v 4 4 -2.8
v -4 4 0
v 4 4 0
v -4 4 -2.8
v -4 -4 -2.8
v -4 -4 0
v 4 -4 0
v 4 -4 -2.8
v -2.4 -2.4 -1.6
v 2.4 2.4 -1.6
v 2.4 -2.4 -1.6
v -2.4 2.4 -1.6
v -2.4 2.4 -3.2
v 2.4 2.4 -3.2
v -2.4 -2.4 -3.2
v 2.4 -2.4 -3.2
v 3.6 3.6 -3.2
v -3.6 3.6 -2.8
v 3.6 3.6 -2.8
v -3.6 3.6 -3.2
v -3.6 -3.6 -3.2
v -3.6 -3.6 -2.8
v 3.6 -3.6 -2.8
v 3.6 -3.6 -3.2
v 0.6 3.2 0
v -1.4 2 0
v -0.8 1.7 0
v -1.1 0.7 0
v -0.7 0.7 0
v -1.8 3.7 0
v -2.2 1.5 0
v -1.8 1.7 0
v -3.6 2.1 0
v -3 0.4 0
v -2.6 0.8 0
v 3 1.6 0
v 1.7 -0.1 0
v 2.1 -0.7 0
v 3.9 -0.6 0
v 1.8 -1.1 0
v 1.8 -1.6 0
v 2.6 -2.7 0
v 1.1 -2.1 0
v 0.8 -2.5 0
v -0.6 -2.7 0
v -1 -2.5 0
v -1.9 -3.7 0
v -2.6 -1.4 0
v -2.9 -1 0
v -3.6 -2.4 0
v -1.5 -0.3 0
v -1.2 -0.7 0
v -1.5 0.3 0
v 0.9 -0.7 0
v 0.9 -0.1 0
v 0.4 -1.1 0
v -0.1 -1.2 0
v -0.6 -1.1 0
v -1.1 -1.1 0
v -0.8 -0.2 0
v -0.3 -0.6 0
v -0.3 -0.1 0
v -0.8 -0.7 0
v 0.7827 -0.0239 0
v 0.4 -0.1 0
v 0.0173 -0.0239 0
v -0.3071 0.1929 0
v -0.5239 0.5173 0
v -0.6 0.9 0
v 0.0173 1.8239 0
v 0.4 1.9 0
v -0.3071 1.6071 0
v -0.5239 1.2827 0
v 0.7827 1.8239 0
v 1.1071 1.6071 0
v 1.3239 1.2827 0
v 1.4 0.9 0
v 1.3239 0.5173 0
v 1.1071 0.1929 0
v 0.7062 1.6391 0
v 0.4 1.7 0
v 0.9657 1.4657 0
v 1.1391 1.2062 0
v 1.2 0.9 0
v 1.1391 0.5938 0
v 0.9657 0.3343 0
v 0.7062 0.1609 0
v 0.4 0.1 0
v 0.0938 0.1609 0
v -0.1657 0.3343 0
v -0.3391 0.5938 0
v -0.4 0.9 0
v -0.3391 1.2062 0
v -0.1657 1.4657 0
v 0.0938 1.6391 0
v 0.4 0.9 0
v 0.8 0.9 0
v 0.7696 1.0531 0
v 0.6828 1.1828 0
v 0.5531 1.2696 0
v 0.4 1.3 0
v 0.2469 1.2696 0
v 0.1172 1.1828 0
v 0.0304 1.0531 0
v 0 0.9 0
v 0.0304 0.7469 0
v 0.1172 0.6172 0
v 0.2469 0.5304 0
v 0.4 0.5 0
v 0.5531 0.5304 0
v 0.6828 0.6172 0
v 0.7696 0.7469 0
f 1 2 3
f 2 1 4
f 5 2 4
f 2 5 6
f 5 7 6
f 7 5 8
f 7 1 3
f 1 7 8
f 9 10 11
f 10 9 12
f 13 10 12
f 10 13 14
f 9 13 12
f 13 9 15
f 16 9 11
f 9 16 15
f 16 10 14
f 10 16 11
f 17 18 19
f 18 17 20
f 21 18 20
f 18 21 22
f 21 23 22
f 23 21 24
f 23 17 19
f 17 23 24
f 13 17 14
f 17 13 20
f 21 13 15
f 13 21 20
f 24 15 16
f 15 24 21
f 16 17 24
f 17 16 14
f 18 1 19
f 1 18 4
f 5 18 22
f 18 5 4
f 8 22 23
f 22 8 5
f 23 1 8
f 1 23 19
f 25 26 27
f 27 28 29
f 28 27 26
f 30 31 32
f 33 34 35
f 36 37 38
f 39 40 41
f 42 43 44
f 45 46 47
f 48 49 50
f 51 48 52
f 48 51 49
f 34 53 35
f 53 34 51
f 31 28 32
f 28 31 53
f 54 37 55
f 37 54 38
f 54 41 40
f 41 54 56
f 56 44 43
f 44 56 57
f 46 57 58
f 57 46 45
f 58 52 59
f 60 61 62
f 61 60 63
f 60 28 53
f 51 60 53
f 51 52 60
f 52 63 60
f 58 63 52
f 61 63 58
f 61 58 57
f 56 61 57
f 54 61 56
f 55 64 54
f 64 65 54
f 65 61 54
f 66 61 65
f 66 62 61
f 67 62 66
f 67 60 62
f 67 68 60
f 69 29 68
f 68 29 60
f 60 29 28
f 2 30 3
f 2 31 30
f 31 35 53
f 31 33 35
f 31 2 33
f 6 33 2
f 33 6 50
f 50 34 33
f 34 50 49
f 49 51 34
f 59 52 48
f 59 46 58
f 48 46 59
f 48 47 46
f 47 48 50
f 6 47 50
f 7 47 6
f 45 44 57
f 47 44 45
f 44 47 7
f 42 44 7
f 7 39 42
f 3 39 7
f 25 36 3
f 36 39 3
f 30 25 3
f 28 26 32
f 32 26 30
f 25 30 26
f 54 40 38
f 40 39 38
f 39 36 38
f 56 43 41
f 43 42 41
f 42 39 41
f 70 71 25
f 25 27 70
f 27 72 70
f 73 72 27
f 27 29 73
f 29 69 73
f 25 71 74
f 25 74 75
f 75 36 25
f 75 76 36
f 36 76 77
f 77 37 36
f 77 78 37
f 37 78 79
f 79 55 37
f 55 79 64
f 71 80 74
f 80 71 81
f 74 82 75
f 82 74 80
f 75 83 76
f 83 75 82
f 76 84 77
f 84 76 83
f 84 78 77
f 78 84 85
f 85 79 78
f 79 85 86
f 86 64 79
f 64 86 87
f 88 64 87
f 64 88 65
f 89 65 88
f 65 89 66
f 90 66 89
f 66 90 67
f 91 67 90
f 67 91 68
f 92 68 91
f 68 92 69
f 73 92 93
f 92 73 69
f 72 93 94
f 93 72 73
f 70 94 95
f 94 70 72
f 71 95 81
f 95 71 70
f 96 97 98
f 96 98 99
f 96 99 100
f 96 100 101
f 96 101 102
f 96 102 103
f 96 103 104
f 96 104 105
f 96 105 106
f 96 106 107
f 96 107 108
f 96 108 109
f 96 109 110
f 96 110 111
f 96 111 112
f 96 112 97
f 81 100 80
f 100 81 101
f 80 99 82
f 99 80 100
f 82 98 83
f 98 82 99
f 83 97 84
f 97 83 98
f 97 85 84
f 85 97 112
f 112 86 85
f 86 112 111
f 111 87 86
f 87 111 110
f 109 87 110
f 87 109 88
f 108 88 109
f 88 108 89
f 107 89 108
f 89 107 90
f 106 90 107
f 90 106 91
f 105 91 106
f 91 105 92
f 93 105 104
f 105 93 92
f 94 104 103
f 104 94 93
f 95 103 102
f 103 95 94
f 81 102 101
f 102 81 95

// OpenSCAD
// file: ../p/4-4edge.scad
use <../lib.scad>
$fa=1; $fs=0.2;
function ldraw_lib__4_4edge(realsolid=false) = [
// 0 Circle 1.0
// 0 Name: 4-4edge.dat
// 0 Author: James Jessiman
// 0 !LDRAW_ORG Primitive UPDATE 2017-01
// 0 !LICENSE Licensed under CC BY 2.0 and CC BY 4.0 : see CAreadme.txt
// 
// 0 BFC CERTIFY CCW
  [0,"BFC","CERTIFY"],
  [0,"BFC","CCW"],
// 
// 0 !HISTORY 1998-12-15 [PTadmin] Official Update 1998-10
// 0 !HISTORY 2005-12-28 [PTadmin] Official Update 2005-01
// 0 !HISTORY 2007-06-24 [PTadmin] Header formatted for Contributor Agreement
// 0 !HISTORY 2008-07-01 [PTadmin] Official Update 2008-01
// 0 !HISTORY 2017-01-15 [Steffen] BFCed
// 0 !HISTORY 2017-12-30 [PTadmin] Official Update 2017-01
// 
// 
// 2 24 1 0 0 0.9239 0 0.3827
  [2,24,1,0,0,0.9239,0,0.3827],
// 2 24 0.9239 0 0.3827 0.7071 0 0.7071
  [2,24,0.9239,0,0.3827,0.7071,0,0.7071],
// 2 24 0.7071 0 0.7071 0.3827 0 0.9239
  [2,24,0.7071,0,0.7071,0.3827,0,0.9239],
// 2 24 0.3827 0 0.9239 0 0 1
  [2,24,0.3827,0,0.9239,0,0,1],
// 2 24 0 0 1 -0.3827 0 0.9239
  [2,24,0,0,1,-0.3827,0,0.9239],
// 2 24 -0.3827 0 0.9239 -0.7071 0 0.7071
  [2,24,-0.3827,0,0.9239,-0.7071,0,0.7071],
// 2 24 -0.7071 0 0.7071 -0.9239 0 0.3827
  [2,24,-0.7071,0,0.7071,-0.9239,0,0.3827],
// 2 24 -0.9239 0 0.3827 -1 0 -0
  [2,24,-0.9239,0,0.3827,-1,0,-0],
// 2 24 -1 0 -0 -0.9239 0 -0.3827
  [2,24,-1,0,-0,-0.9239,0,-0.3827],
// 2 24 -0.9239 0 -0.3827 -0.7071 0 -0.7071
  [2,24,-0.9239,0,-0.3827,-0.7071,0,-0.7071],
// 2 24 -0.7071 0 -0.7071 -0.3827 0 -0.9239
  [2,24,-0.7071,0,-0.7071,-0.3827,0,-0.9239],
// 2 24 -0.3827 0 -0.9239 0 0 -1
  [2,24,-0.3827,0,-0.9239,0,0,-1],
// 2 24 0 0 -1 0.3827 0 -0.9239
  [2,24,0,0,-1,0.3827,0,-0.9239],
// 2 24 0.3827 0 -0.9239 0.7071 0 -0.7071
  [2,24,0.3827,0,-0.9239,0.7071,0,-0.7071],
// 2 24 0.7071 0 -0.7071 0.9239 0 -0.3827
  [2,24,0.7071,0,-0.7071,0.9239,0,-0.3827],
// 2 24 0.9239 0 -0.3827 1 0 0
  [2,24,0.9239,0,-0.3827,1,0,0],
];
module ldraw_lib__4_4edge(step=0, col=false, unit=2/5, alt=false, line=0.2, solid=!$preview)
    makepoly(ldraw_lib__4_4edge(solid), step=step, col=col, unit=unit, alt=alt, line=line, solid=solid);
ldraw_lib__4_4edge(line=0.2);
// file: ../p/4-4cyli.scad
use <../lib.scad>
$fa=1; $fs=0.2;
function ldraw_lib__4_4cyli(realsolid=false) = [
// 0 Cylinder 1.0
// 0 Name: 4-4cyli.dat
// 0 Author: James Jessiman
// 0 !LDRAW_ORG Primitive UPDATE 2005-01
// 0 !LICENSE Licensed under CC BY 2.0 and CC BY 4.0 : see CAreadme.txt
// 
// 0 BFC CERTIFY CCW
  [0,"BFC","CERTIFY"],
  [0,"BFC","CCW"],
// 
// 0 !HISTORY 1998-12-15 [PTadmin] Official Update 1998-10
// 0 !HISTORY 2002-03-23 [sbliss] Added BFC statement; merged headers from files in distributions LDraw 0.27 and Complete.
// 0 !HISTORY 2002-04-25 [PTadmin] Official Update 2002-02
// 0 !HISTORY 2004-12-14 [guyvivan] BFC CCW
// 0 !HISTORY 2005-12-28 [PTadmin] Official Update 2005-01
// 0 !HISTORY 2007-06-24 [PTadmin] Header formatted for Contributor Agreement
// 0 !HISTORY 2008-07-01 [PTadmin] Official Update 2008-01
// 
// 
// 4 16 1 1 0 0.9239 1 0.3827 0.9239 0 0.3827 1 0 0
  [4,16,1,1,0,0.9239,1,0.3827,0.9239,0,0.3827,1,0,0],
// 5 24 1 0 0 1 1 0 0.9239 0 0.3827 0.9239 0 -0.3827
  [5,24,1,0,0,1,1,0,0.9239,0,0.3827,0.9239,0,-0.3827],
// 4 16 0.9239 1 0.3827 0.7071 1 0.7071 0.7071 0 0.7071 0.9239 0 0.3827
  [4,16,0.9239,1,0.3827,0.7071,1,0.7071,0.7071,0,0.7071,0.9239,0,0.3827],
// 5 24 0.9239 0 0.3827 0.9239 1 0.3827 0.7071 0 0.7071 1 0 0
  [5,24,0.9239,0,0.3827,0.9239,1,0.3827,0.7071,0,0.7071,1,0,0],
// 4 16 0.7071 1 0.7071 0.3827 1 0.9239 0.3827 0 0.9239 0.7071 0 0.7071
  [4,16,0.7071,1,0.7071,0.3827,1,0.9239,0.3827,0,0.9239,0.7071,0,0.7071],
// 5 24 0.7071 0 0.7071 0.7071 1 0.7071 0.3827 0 0.9239 0.9239 0 0.3827
  [5,24,0.7071,0,0.7071,0.7071,1,0.7071,0.3827,0,0.9239,0.9239,0,0.3827],
// 4 16 0.3827 1 0.9239 0 1 1 0 0 1 0.3827 0 0.9239
  [4,16,0.3827,1,0.9239,0,1,1,0,0,1,0.3827,0,0.9239],
// 5 24 0.3827 0 0.9239 0.3827 1 0.9239 0 0 1 0.7071 0 0.7071
  [5,24,0.3827,0,0.9239,0.3827,1,0.9239,0,0,1,0.7071,0,0.7071],
// 4 16 0 1 1 -0.3827 1 0.9239 -0.3827 0 0.9239 0 0 1
  [4,16,0,1,1,-0.3827,1,0.9239,-0.3827,0,0.9239,0,0,1],
// 5 24 0 0 1 0 1 1 -0.3827 0 0.9239 0.3827 0 0.9239
  [5,24,0,0,1,0,1,1,-0.3827,0,0.9239,0.3827,0,0.9239],
// 4 16 -0.3827 1 0.9239 -0.7071 1 0.7071 -0.7071 0 0.7071 -0.3827 0 0.9239
  [4,16,-0.3827,1,0.9239,-0.7071,1,0.7071,-0.7071,0,0.7071,-0.3827,0,0.9239],
// 5 24 -0.3827 0 0.9239 -0.3827 1 0.9239 -0.7071 0 0.7071 0 0 1
  [5,24,-0.3827,0,0.9239,-0.3827,1,0.9239,-0.7071,0,0.7071,0,0,1],
// 4 16 -0.7071 1 0.7071 -0.9239 1 0.3827 -0.9239 0 0.3827 -0.7071 0 0.7071
  [4,16,-0.7071,1,0.7071,-0.9239,1,0.3827,-0.9239,0,0.3827,-0.7071,0,0.7071],
// 5 24 -0.7071 0 0.7071 -0.7071 1 0.7071 -0.9239 0 0.3827 -0.3827 0 0.9239
  [5,24,-0.7071,0,0.7071,-0.7071,1,0.7071,-0.9239,0,0.3827,-0.3827,0,0.9239],
// 4 16 -0.9239 1 0.3827 -1 1 0 -1 0 0 -0.9239 0 0.3827
  [4,16,-0.9239,1,0.3827,-1,1,0,-1,0,0,-0.9239,0,0.3827],
// 5 24 -0.9239 0 0.3827 -0.9239 1 0.3827 -1 0 0 -0.7071 0 0.7071
  [5,24,-0.9239,0,0.3827,-0.9239,1,0.3827,-1,0,0,-0.7071,0,0.7071],
// 4 16 -1 1 0 -0.9239 1 -0.3827 -0.9239 0 -0.3827 -1 0 0
  [4,16,-1,1,0,-0.9239,1,-0.3827,-0.9239,0,-0.3827,-1,0,0],
// 5 24 -1 0 0 -1 1 0 -0.9239 0 -0.3827 -0.9239 0 0.3827
  [5,24,-1,0,0,-1,1,0,-0.9239,0,-0.3827,-0.9239,0,0.3827],
// 4 16 -0.9239 1 -0.3827 -0.7071 1 -0.7071 -0.7071 0 -0.7071 -0.9239 0 -0.3827
  [4,16,-0.9239,1,-0.3827,-0.7071,1,-0.7071,-0.7071,0,-0.7071,-0.9239,0,-0.3827],
// 5 24 -0.9239 0 -0.3827 -0.9239 1 -0.3827 -0.7071 0 -0.7071 -1 0 0
  [5,24,-0.9239,0,-0.3827,-0.9239,1,-0.3827,-0.7071,0,-0.7071,-1,0,0],
// 4 16 -0.7071 1 -0.7071 -0.3827 1 -0.9239 -0.3827 0 -0.9239 -0.7071 0 -0.7071
  [4,16,-0.7071,1,-0.7071,-0.3827,1,-0.9239,-0.3827,0,-0.9239,-0.7071,0,-0.7071],
// 5 24 -0.7071 0 -0.7071 -0.7071 1 -0.7071 -0.3827 0 -0.9239 -0.9239 0 -0.3827
  [5,24,-0.7071,0,-0.7071,-0.7071,1,-0.7071,-0.3827,0,-0.9239,-0.9239,0,-0.3827],
// 4 16 -0.3827 1 -0.9239 0 1 -1 0 0 -1 -0.3827 0 -0.9239
  [4,16,-0.3827,1,-0.9239,0,1,-1,0,0,-1,-0.3827,0,-0.9239],
// 5 24 -0.3827 0 -0.9239 -0.3827 1 -0.9239 0 0 -1 -0.7071 0 -0.7071
  [5,24,-0.3827,0,-0.9239,-0.3827,1,-0.9239,0,0,-1,-0.7071,0,-0.7071],
// 4 16 0 1 -1 0.3827 1 -0.9239 0.3827 0 -0.9239 0 0 -1
  [4,16,0,1,-1,0.3827,1,-0.9239,0.3827,0,-0.9239,0,0,-1],
// 5 24 0 0 -1 0 1 -1 0.3827 0 -0.9239 -0.3827 0 -0.9239
  [5,24,0,0,-1,0,1,-1,0.3827,0,-0.9239,-0.3827,0,-0.9239],
// 4 16 0.3827 1 -0.9239 0.7071 1 -0.7071 0.7071 0 -0.7071 0.3827 0 -0.9239
  [4,16,0.3827,1,-0.9239,0.7071,1,-0.7071,0.7071,0,-0.7071,0.3827,0,-0.9239],
// 5 24 0.3827 0 -0.9239 0.3827 1 -0.9239 0.7071 0 -0.7071 0 0 -1
  [5,24,0.3827,0,-0.9239,0.3827,1,-0.9239,0.7071,0,-0.7071,0,0,-1],
// 4 16 0.7071 1 -0.7071 0.9239 1 -0.3827 0.9239 0 -0.3827 0.7071 0 -0.7071
  [4,16,0.7071,1,-0.7071,0.9239,1,-0.3827,0.9239,0,-0.3827,0.7071,0,-0.7071],
// 5 24 0.7071 0 -0.7071 0.7071 1 -0.7071 0.9239 0 -0.3827 0.3827 0 -0.9239
  [5,24,0.7071,0,-0.7071,0.7071,1,-0.7071,0.9239,0,-0.3827,0.3827,0,-0.9239],
// 4 16 0.9239 1 -0.3827 1 1 0 1 0 0 0.9239 0 -0.3827
  [4,16,0.9239,1,-0.3827,1,1,0,1,0,0,0.9239,0,-0.3827],
// 5 24 0.9239 0 -0.3827 0.9239 1 -0.3827 1 0 0 0.7071 0 -0.7071
  [5,24,0.9239,0,-0.3827,0.9239,1,-0.3827,1,0,0,0.7071,0,-0.7071],
// 0
];
module ldraw_lib__4_4cyli(step=0, col=false, unit=2/5, alt=false, line=0.2, solid=!$preview)
    makepoly(ldraw_lib__4_4cyli(solid), step=step, col=col, unit=unit, alt=alt, line=line, solid=solid);
ldraw_lib__4_4cyli(line=0.2);
// file: ../p/stud3.scad
use <../lib.scad>
use <4-4cyli.scad>
use <4-4disc.scad>
use <4-4edge.scad>
$fa=1; $fs=0.2;
function ldraw_lib__stud3(realsolid=false) = realsolid ? 
    [openscad(translate([0,0,-eps()], o=cylinder(4+eps(), r=4)),2)] : [
// 0 Stud Tube Solid
// 0 Name: stud3.dat
// 0 Author: James Jessiman
// 0 !LDRAW_ORG Primitive UPDATE 2012-01
// 0 !LICENSE Licensed under CC BY 2.0 and CC BY 4.0 : see CAreadme.txt
// 
// 0 BFC CERTIFY CCW
  [0,"BFC","CERTIFY"],
  [0,"BFC","CCW"],
// 
// 0 !HISTORY 2002-04-04 [sbliss] Modified for BFC compliance
// 0 !HISTORY 2002-04-25 [PTadmin] Official Update 2002-02
// 0 !HISTORY 2007-06-24 [PTadmin] Header formatted for Contributor Agreement
// 0 !HISTORY 2008-07-01 [PTadmin] Official Update 2008-01
// 0 !HISTORY 2012-02-16 [Philo] Changed to CCW
// 0 !HISTORY 2012-03-30 [PTadmin] Official Update 2012-01
// 
// 
// 1 16 0 -4 0 4 0 0 0 1 0 0 0 4 4-4edge.dat
  [1,16,0,-4,0,4,0,0,0,1,0,0,0,4, ldraw_lib__4_4edge(realsolid)],
// 1 16 0 0 0 4 0 0 0 1 0 0 0 4 4-4edge.dat
  [1,16,0,0,0,4,0,0,0,1,0,0,0,4, ldraw_lib__4_4edge(realsolid)],
// 1 16 0 -4 0 4 0 0 0 1 0 0 0 4 4-4disc.dat
  [1,16,0,-4,0,4,0,0,0,1,0,0,0,4, ldraw_lib__4_4disc(realsolid)],
// 1 16 0 -4 0 4 0 0 0 4 0 0 0 4 4-4cyli.dat
  [1,16,0,-4,0,4,0,0,0,4,0,0,0,4, ldraw_lib__4_4cyli(realsolid)],
];
module ldraw_lib__stud3(step=0, col=false, unit=2/5, alt=false, line=0.2, solid=!$preview)
    makepoly(ldraw_lib__stud3(solid), step=step, col=col, unit=unit, alt=alt, line=line, solid=solid);
ldraw_lib__stud3(line=0.2);
// file: ../p/stud.scad
use <../lib.scad>
use <4-4cyli.scad>
use <4-4disc.scad>
use <4-4edge.scad>
$fa=1; $fs=0.2;
function ldraw_lib__stud(realsolid=false) = realsolid ? 
    [openscad(translate([0,0,-eps()], o=cylinder(4+eps(), r=6)),2)] : [
// 0 Stud
// 0 Name: stud.dat
// 0 Author: James Jessiman
// 0 !LDRAW_ORG Primitive UPDATE 2012-01
// 0 !LICENSE Licensed under CC BY 2.0 and CC BY 4.0 : see CAreadme.txt
// 
// 0 BFC CERTIFY CCW
  [0,"BFC","CERTIFY"],
  [0,"BFC","CCW"],
// 
// 0 !HISTORY 2002-04-04 [sbliss] Modified for BFC compliance
// 0 !HISTORY 2002-04-25 [PTadmin] Official Update 2002-02
// 0 !HISTORY 2007-06-24 [PTadmin] Header formatted for Contributor Agreement
// 0 !HISTORY 2008-07-01 [PTadmin] Official Update 2008-01
// 0 !HISTORY 2012-02-16 [Philo] Changed to CCW
// 0 !HISTORY 2012-03-30 [PTadmin] Official Update 2012-01
// 
// 
// 1 16 0 0 0 6 0 0 0 1 0 0 0 6 4-4edge.dat
  [1,16,0,0,0,6,0,0,0,1,0,0,0,6, ldraw_lib__4_4edge(realsolid)],
// 1 16 0 -4 0 6 0 0 0 1 0 0 0 6 4-4edge.dat
  [1,16,0,-4,0,6,0,0,0,1,0,0,0,6, ldraw_lib__4_4edge(realsolid)],
// 1 16 0 0 0 6 0 0 0 -4 0 0 0 6 4-4cyli.dat
  [1,16,0,0,0,6,0,0,0,-4,0,0,0,6, ldraw_lib__4_4cyli(realsolid)],
// 1 16 0 -4 0 6 0 0 0 1 0 0 0 6 4-4disc.dat
  [1,16,0,-4,0,6,0,0,0,1,0,0,0,6, ldraw_lib__4_4disc(realsolid)],
];
module ldraw_lib__stud(step=0, col=false, unit=2/5, alt=false, line=0.2, solid=!$preview)
    makepoly(ldraw_lib__stud(solid), step=step, col=col, unit=unit, alt=alt, line=line, solid=solid);
ldraw_lib__stud(line=0.2);
// file: ../p/box4t.scad
use <../lib.scad>
$fa=1; $fs=0.2;
function ldraw_lib__box4t(realsolid=false) = [
// 0 Box with 4 Adjacent Faces and All Edges
// 0 Name: box4t.dat
// 0 Author: Tore Eriksson [Tore_Eriksson]
// 0 !LDRAW_ORG Primitive UPDATE 2003-02
// 0 !LICENSE Licensed under CC BY 2.0 and CC BY 4.0 : see CAreadme.txt
// 
// 0 BFC CERTIFY CCW
  [0,"BFC","CERTIFY"],
  [0,"BFC","CCW"],
// 
// 0 !HISTORY 1997-09-29 [PTadmin] Official Update 1997-15
// 0 !HISTORY 2002-08-31 [izanette] Modified with WINDZ for BFC compliance
// 0 !HISTORY 2003-08-01 [PTadmin] Official Update 2003-02
// 0 !HISTORY 2007-06-24 [PTadmin] Header formatted for Contributor Agreement
// 0 !HISTORY 2008-07-01 [PTadmin] Official Update 2008-01
// 
// 
// 2 24 1 1 1 -1 1 1
  [2,24,1,1,1,-1,1,1],
// 2 24 -1 1 1 -1 1 -1
  [2,24,-1,1,1,-1,1,-1],
// 2 24 -1 1 -1 1 1 -1
  [2,24,-1,1,-1,1,1,-1],
// 2 24 1 1 -1 1 1 1
  [2,24,1,1,-1,1,1,1],
// 2 24 1 0 1 -1 0 1
  [2,24,1,0,1,-1,0,1],
// 2 24 -1 0 1 -1 0 -1
  [2,24,-1,0,1,-1,0,-1],
// 2 24 -1 0 -1 1 0 -1
  [2,24,-1,0,-1,1,0,-1],
// 2 24 1 0 -1 1 0 1
  [2,24,1,0,-1,1,0,1],
// 2 24 1 0 1 1 1 1
  [2,24,1,0,1,1,1,1],
// 2 24 -1 0 1 -1 1 1
  [2,24,-1,0,1,-1,1,1],
// 2 24 1 0 -1 1 1 -1
  [2,24,1,0,-1,1,1,-1],
// 2 24 -1 0 -1 -1 1 -1
  [2,24,-1,0,-1,-1,1,-1],
// 4 16 1 1 1 1 1 -1 -1 1 -1 -1 1 1
  [4,16,1,1,1,1,1,-1,-1,1,-1,-1,1,1],
// 4 16 1 1 1 -1 1 1 -1 0 1 1 0 1
  [4,16,1,1,1,-1,1,1,-1,0,1,1,0,1],
// 4 16 -1 1 1 -1 1 -1 -1 0 -1 -1 0 1
  [4,16,-1,1,1,-1,1,-1,-1,0,-1,-1,0,1],
// 0 4 16 -1 1 -1 -1 0 -1 1 0 -1 1 1 -1
// 4 16 1 1 -1 1 1 1 1 0 1 1 0 -1
  [4,16,1,1,-1,1,1,1,1,0,1,1,0,-1],
// 0
];
module ldraw_lib__box4t(step=0, col=false, unit=2/5, alt=false, line=0.2, solid=!$preview)
    makepoly(ldraw_lib__box4t(solid), step=step, col=col, unit=unit, alt=alt, line=line, solid=solid);
ldraw_lib__box4t(line=0.2);
// file: ../p/box5.scad
use <../lib.scad>
$fa=1; $fs=0.2;
function ldraw_lib__box5(realsolid=false) = [
// 0 Box with 5 Faces and All Edges
// 0 Name: box5.dat
// 0 Author: James Jessiman
// 0 !LDRAW_ORG Primitive UPDATE 2012-01
// 0 !LICENSE Licensed under CC BY 2.0 and CC BY 4.0 : see CAreadme.txt
// 
// 0 BFC CERTIFY CCW
  [0,"BFC","CERTIFY"],
  [0,"BFC","CCW"],
// 
// 0 !HISTORY 2002-04-03 [sbliss] Modified for BFC compliance
// 0 !HISTORY 2002-04-25 [PTadmin] Official Update 2002-02
// 0 !HISTORY 2007-06-24 [PTadmin] Header formatted for Contributor Agreement
// 0 !HISTORY 2008-07-01 [PTadmin] Official Update 2008-01
// 0 !HISTORY 2012-02-16 [Philo] Changed to CCW
// 0 !HISTORY 2012-03-30 [PTadmin] Official Update 2012-01
// 
// 
// 2 24 1 1 1 -1 1 1
  [2,24,1,1,1,-1,1,1],
// 2 24 -1 1 1 -1 1 -1
  [2,24,-1,1,1,-1,1,-1],
// 2 24 -1 1 -1 1 1 -1
  [2,24,-1,1,-1,1,1,-1],
// 2 24 1 1 -1 1 1 1
  [2,24,1,1,-1,1,1,1],
// 2 24 1 0 1 -1 0 1
  [2,24,1,0,1,-1,0,1],
// 2 24 -1 0 1 -1 0 -1
  [2,24,-1,0,1,-1,0,-1],
// 2 24 -1 0 -1 1 0 -1
  [2,24,-1,0,-1,1,0,-1],
// 2 24 1 0 -1 1 0 1
  [2,24,1,0,-1,1,0,1],
// 2 24 1 0 1 1 1 1
  [2,24,1,0,1,1,1,1],
// 2 24 -1 0 1 -1 1 1
  [2,24,-1,0,1,-1,1,1],
// 2 24 1 0 -1 1 1 -1
  [2,24,1,0,-1,1,1,-1],
// 2 24 -1 0 -1 -1 1 -1
  [2,24,-1,0,-1,-1,1,-1],
// 4 16 -1 1 1 1 1 1 1 1 -1 -1 1 -1
  [4,16,-1,1,1,1,1,1,1,1,-1,-1,1,-1],
// 4 16 -1 1 1 -1 0 1 1 0 1 1 1 1
  [4,16,-1,1,1,-1,0,1,1,0,1,1,1,1],
// 4 16 -1 1 -1 -1 0 -1 -1 0 1 -1 1 1
  [4,16,-1,1,-1,-1,0,-1,-1,0,1,-1,1,1],
// 4 16 1 1 -1 1 0 -1 -1 0 -1 -1 1 -1
  [4,16,1,1,-1,1,0,-1,-1,0,-1,-1,1,-1],
// 4 16 1 1 1 1 0 1 1 0 -1 1 1 -1
  [4,16,1,1,1,1,0,1,1,0,-1,1,1,-1],
];
module ldraw_lib__box5(step=0, col=false, unit=2/5, alt=false, line=0.2, solid=!$preview)
    makepoly(ldraw_lib__box5(solid), step=step, col=col, unit=unit, alt=alt, line=line, solid=solid);
ldraw_lib__box5(line=0.2);
// file: ../p/box4.scad
use <../lib.scad>
$fa=1; $fs=0.2;
function ldraw_lib__box4(realsolid=false) = [
// 0 Box with 4 Faces (2 Parallel Pairs) and All Edges
// 0 Name: box4.dat
// 0 Author: James Jessiman
// 0 !LDRAW_ORG Primitive UPDATE 2012-01
// 0 !LICENSE Licensed under CC BY 2.0 and CC BY 4.0 : see CAreadme.txt
// 
// 0 BFC CERTIFY CCW
  [0,"BFC","CERTIFY"],
  [0,"BFC","CCW"],
// 
// 0 !HISTORY 2002-04-03 [sbliss] Modified for BFC compliance
// 0 !HISTORY 2002-04-25 [PTadmin] Official Update 2002-02
// 0 !HISTORY 2007-06-24 [PTadmin] Header formatted for Contributor Agreement
// 0 !HISTORY 2008-07-01 [PTadmin] Official Update 2008-01
// 0 !HISTORY 2012-02-16 [Philo] Changed to CCW
// 0 !HISTORY 2012-03-30 [PTadmin] Official Update 2012-01
// 
// 
// 2 24 1 1 1 -1 1 1
  [2,24,1,1,1,-1,1,1],
// 2 24 -1 1 1 -1 1 -1
  [2,24,-1,1,1,-1,1,-1],
// 2 24 -1 1 -1 1 1 -1
  [2,24,-1,1,-1,1,1,-1],
// 2 24 1 1 -1 1 1 1
  [2,24,1,1,-1,1,1,1],
// 2 24 1 0 1 -1 0 1
  [2,24,1,0,1,-1,0,1],
// 2 24 -1 0 1 -1 0 -1
  [2,24,-1,0,1,-1,0,-1],
// 2 24 -1 0 -1 1 0 -1
  [2,24,-1,0,-1,1,0,-1],
// 2 24 1 0 -1 1 0 1
  [2,24,1,0,-1,1,0,1],
// 2 24 1 0 1 1 1 1
  [2,24,1,0,1,1,1,1],
// 2 24 -1 0 1 -1 1 1
  [2,24,-1,0,1,-1,1,1],
// 2 24 1 0 -1 1 1 -1
  [2,24,1,0,-1,1,1,-1],
// 2 24 -1 0 -1 -1 1 -1
  [2,24,-1,0,-1,-1,1,-1],
// 4 16 -1 1 1 -1 0 1 1 0 1 1 1 1
  [4,16,-1,1,1,-1,0,1,1,0,1,1,1,1],
// 4 16 -1 1 -1 -1 0 -1 -1 0 1 -1 1 1
  [4,16,-1,1,-1,-1,0,-1,-1,0,1,-1,1,1],
// 4 16 1 1 -1 1 0 -1 -1 0 -1 -1 1 -1
  [4,16,1,1,-1,1,0,-1,-1,0,-1,-1,1,-1],
// 4 16 1 1 1 1 0 1 1 0 -1 1 1 -1
  [4,16,1,1,1,1,0,1,1,0,-1,1,1,-1],
];
module ldraw_lib__box4(step=0, col=false, unit=2/5, alt=false, line=0.2, solid=!$preview)
    makepoly(ldraw_lib__box4(solid), step=step, col=col, unit=unit, alt=alt, line=line, solid=solid);
ldraw_lib__box4(line=0.2);
// file: s/3004s01.scad
use <../../lib.scad>
use <../../p/box4t.scad>
use <../../p/box5.scad>
use <../../p/stud.scad>
use <../../p/stud3.scad>
$fa=1; $fs=0.2;
function ldraw_lib__s__3004s01(realsolid=false) = [
// 0 ~Brick  1 x  2 without Front Face
// 0 Name: s\3004s01.dat
// 0 Author: James Jessiman
// 0 !LDRAW_ORG Subpart UPDATE 2003-03
// 0 !LICENSE Licensed under CC BY 2.0 and CC BY 4.0 : see CAreadme.txt
// 
// 0 BFC CERTIFY CCW
  [0,"BFC","CERTIFY"],
  [0,"BFC","CCW"],
// 
// 0 !HISTORY 2003-09-07 [jriley] Subfiling, BFC
// 0 !HISTORY 2003-12-19 [PTadmin] Official Update 2003-03
// 0 !HISTORY 2007-08-29 [PTadmin] Header formatted for Contributor Agreement
// 0 !HISTORY 2008-07-01 [PTadmin] Official Update 2008-01
// 
// 
// 1 16 0 4 0 1 0 0 0 -5 0 0 0 1 stud3.dat
  [1,16,0,4,0,1,0,0,0,-5,0,0,0,1, ldraw_lib__stud3(realsolid)],
// 0 BFC INVERTNEXT
  [0,"BFC","INVERTNEXT"],
// 1 16 0 24 0 16 0 0 0 -20 0 0 0 6 box5.dat
  [1,16,0,24,0,16,0,0,0,-20,0,0,0,6, ldraw_lib__box5(realsolid)],
// 4 16 20 24 10 16 24 6 -16 24 6 -20 24 10
  [4,16,20,24,10,16,24,6,-16,24,6,-20,24,10],
// 4 16 -20 24 10 -16 24 6 -16 24 -6 -20 24 -10
  [4,16,-20,24,10,-16,24,6,-16,24,-6,-20,24,-10],
// 4 16 -20 24 -10 -16 24 -6 16 24 -6 20 24 -10
  [4,16,-20,24,-10,-16,24,-6,16,24,-6,20,24,-10],
// 4 16 20 24 -10 16 24 -6 16 24 6 20 24 10
  [4,16,20,24,-10,16,24,-6,16,24,6,20,24,10],
// 1 16 0 24 0 20 0 0 0 -24 0 0 0 10 box4t.dat
  [1,16,0,24,0,20,0,0,0,-24,0,0,0,10, ldraw_lib__box4t(realsolid)],
// 1 16 10 0 0 1 0 0 0 1 0 0 0 1 stud.dat
  [1,16,10,0,0,1,0,0,0,1,0,0,0,1, ldraw_lib__stud(realsolid)],
// 1 16 -10 0 0 1 0 0 0 1 0 0 0 1 stud.dat
  [1,16,-10,0,0,1,0,0,0,1,0,0,0,1, ldraw_lib__stud(realsolid)],
// 0
];
module ldraw_lib__s__3004s01(step=0, col=false, unit=2/5, alt=false, line=0.2, solid=!$preview)
    makepoly(ldraw_lib__s__3004s01(solid), step=step, col=col, unit=unit, alt=alt, line=line, solid=solid);
ldraw_lib__s__3004s01(line=0.2);
// file: s/3070bs01.scad
use <../../lib.scad>
use <../../p/box4.scad>
use <../../p/box5.scad>
$fa=1; $fs=0.2;
function ldraw_lib__s__3070bs01(realsolid=false) = [
// 0 ~Tile  1 x  1 with Groove without Top Face
// 0 Name: s\3070bs01.dat
// 0 Author: Chris Dee [cwdee]
// 0 !LDRAW_ORG Subpart UPDATE 2009-02
// 0 !LICENSE Licensed under CC BY 2.0 and CC BY 4.0 : see CAreadme.txt
// 
// 0 BFC CERTIFY CCW
  [0,"BFC","CERTIFY"],
  [0,"BFC","CCW"],
// 
// 0 !HISTORY 2009-09-03 [PTadmin] Official Update 2009-02
// 
// 
// 1 16 0 0 0 10 0 0 0 7 0 0 0 10 box4.dat
  [1,16,0,0,0,10,0,0,0,7,0,0,0,10, ldraw_lib__box4(realsolid)],
// 0 BFC INVERTNEXT
  [0,"BFC","INVERTNEXT"],
// 1 16 0 8 0 6 0 0 0 -4 0 0 0 6 box5.dat
  [1,16,0,8,0,6,0,0,0,-4,0,0,0,6, ldraw_lib__box5(realsolid)],
// 1 16 0 7 0 9 0 0 0 1 0 0 0 9 box4.dat
  [1,16,0,7,0,9,0,0,0,1,0,0,0,9, ldraw_lib__box4(realsolid)],
// 
// 4 16 9 8 9 6 8 6 -6 8 6 -9 8 9
  [4,16,9,8,9,6,8,6,-6,8,6,-9,8,9],
// 4 16 -9 8 9 -6 8 6 -6 8 -6 -9 8 -9
  [4,16,-9,8,9,-6,8,6,-6,8,-6,-9,8,-9],
// 4 16 -9 8 -9 -6 8 -6 6 8 -6 9 8 -9
  [4,16,-9,8,-9,-6,8,-6,6,8,-6,9,8,-9],
// 4 16 9 8 -9 6 8 -6 6 8 6 9 8 9
  [4,16,9,8,-9,6,8,-6,6,8,6,9,8,9],
// 
// 4 16 10 7 10 9 7 9 -9 7 9 -10 7 10
  [4,16,10,7,10,9,7,9,-9,7,9,-10,7,10],
// 4 16 -10 7 10 -9 7 9 -9 7 -9 -10 7 -10
  [4,16,-10,7,10,-9,7,9,-9,7,-9,-10,7,-10],
// 4 16 -10 7 -10 -9 7 -9 9 7 -9 10 7 -10
  [4,16,-10,7,-10,-9,7,-9,9,7,-9,10,7,-10],
// 4 16 10 7 -10 9 7 -9 9 7 9 10 7 10
  [4,16,10,7,-10,9,7,-9,9,7,9,10,7,10],
// 0
];
module ldraw_lib__s__3070bs01(step=0, col=false, unit=2/5, alt=false, line=0.2, solid=!$preview)
    makepoly(ldraw_lib__s__3070bs01(solid), step=step, col=col, unit=unit, alt=alt, line=line, solid=solid);
ldraw_lib__s__3070bs01(line=0.2);
// file: ../p/4-4disc.scad
use <../lib.scad>
$fa=1; $fs=0.2;
function ldraw_lib__4_4disc(realsolid=false) = [
// 0 Disc 1.0
// 0 Name: 4-4disc.dat
// 0 Author: James Jessiman
// 0 !LDRAW_ORG Primitive UPDATE 2002-02
// 0 !LICENSE Licensed under CC BY 2.0 and CC BY 4.0 : see CAreadme.txt
// 
// 0 BFC CERTIFY CCW
  [0,"BFC","CERTIFY"],
  [0,"BFC","CCW"],
// 
// 0 !HISTORY 1998-12-15 [PTadmin] Official Update 1998-10
// 0 !HISTORY 2002-03-23 [sbliss] Added BFC statement
// 0 !HISTORY 2002-04-25 [PTadmin] Official Update 2002-02
// 0 !HISTORY 2007-06-24 [PTadmin] Header formatted for Contributor Agreement
// 0 !HISTORY 2008-07-01 [PTadmin] Official Update 2008-01
// 
// 
// 3 16 0 0 0 1 0 0 0.9239 0 0.3827
  [3,16,0,0,0,1,0,0,0.9239,0,0.3827],
// 3 16 0 0 0 0.9239 0 0.3827 0.7071 0 0.7071
  [3,16,0,0,0,0.9239,0,0.3827,0.7071,0,0.7071],
// 3 16 0 0 0 0.7071 0 0.7071 0.3827 0 0.9239
  [3,16,0,0,0,0.7071,0,0.7071,0.3827,0,0.9239],
// 3 16 0 0 0 0.3827 0 0.9239 0 0 1
  [3,16,0,0,0,0.3827,0,0.9239,0,0,1],
// 3 16 0 0 0 0 0 1 -0.3827 0 0.9239
  [3,16,0,0,0,0,0,1,-0.3827,0,0.9239],
// 3 16 0 0 0 -0.3827 0 0.9239 -0.7071 0 0.7071
  [3,16,0,0,0,-0.3827,0,0.9239,-0.7071,0,0.7071],
// 3 16 0 0 0 -0.7071 0 0.7071 -0.9239 0 0.3827
  [3,16,0,0,0,-0.7071,0,0.7071,-0.9239,0,0.3827],
// 3 16 0 0 0 -0.9239 0 0.3827 -1 0 -0
  [3,16,0,0,0,-0.9239,0,0.3827,-1,0,-0],
// 3 16 0 0 0 -1 0 -0 -0.9239 0 -0.3827
  [3,16,0,0,0,-1,0,-0,-0.9239,0,-0.3827],
// 3 16 0 0 0 -0.9239 0 -0.3827 -0.7071 0 -0.7071
  [3,16,0,0,0,-0.9239,0,-0.3827,-0.7071,0,-0.7071],
// 3 16 0 0 0 -0.7071 0 -0.7071 -0.3827 0 -0.9239
  [3,16,0,0,0,-0.7071,0,-0.7071,-0.3827,0,-0.9239],
// 3 16 0 0 0 -0.3827 0 -0.9239 0 0 -1
  [3,16,0,0,0,-0.3827,0,-0.9239,0,0,-1],
// 3 16 0 0 0 0 0 -1 0.3827 0 -0.9239
  [3,16,0,0,0,0,0,-1,0.3827,0,-0.9239],
// 3 16 0 0 0 0.3827 0 -0.9239 0.7071 0 -0.7071
  [3,16,0,0,0,0.3827,0,-0.9239,0.7071,0,-0.7071],
// 3 16 0 0 0 0.7071 0 -0.7071 0.9239 0 -0.3827
  [3,16,0,0,0,0.7071,0,-0.7071,0.9239,0,-0.3827],
// 3 16 0 0 0 0.9239 0 -0.3827 1 0 0
  [3,16,0,0,0,0.9239,0,-0.3827,1,0,0],
// 0
];
module ldraw_lib__4_4disc(step=0, col=false, unit=2/5, alt=false, line=0.2, solid=!$preview)
    makepoly(ldraw_lib__4_4disc(solid), step=step, col=col, unit=unit, alt=alt, line=line, solid=solid);
ldraw_lib__4_4disc(line=0.2);
// file: 3004.scad
use <../lib.scad>
use <s/3004s01.scad>
$fa=1; $fs=0.2;
function ldraw_lib__3004(realsolid=false) = [
// 0 Brick  1 x  2
// 0 Name: 3004.dat
// 0 Author: James Jessiman
// 0 !LDRAW_ORG Part UPDATE 2022-05
// 0 !LICENSE Licensed under CC BY 2.0 and CC BY 4.0 : see CAreadme.txt
// 
// 0 BFC CERTIFY CCW
  [0,"BFC","CERTIFY"],
  [0,"BFC","CCW"],
// 
// 0 !HISTORY 2001-10-26 [PTadmin] Official Update 2001-01
// 0 !HISTORY 2002-05-07 {unknown} BFC Certification
// 0 !HISTORY 2002-06-11 [PTadmin] Official Update 2002-03
// 0 !HISTORY 2007-05-07 [PTadmin] Header formatted for Contributor Agreement
// 0 !HISTORY 2008-07-01 [PTadmin] Official Update 2008-01
// 0 !HISTORY 2022-08-04 [MagFors] Using subfile
// 0 !HISTORY 2022-09-15 [PTadmin] Official Update 2022-05
// 
// 
// 1 16 0 0 0 1 0 0 0 1 0 0 0 1 s\3004s01.dat
  [1,16,0,0,0,1,0,0,0,1,0,0,0,1, ldraw_lib__s__3004s01(realsolid)],
// 4 16 -20 24 -10 20 24 -10 20 0 -10 -20 0 -10
  [4,16,-20,24,-10,20,24,-10,20,0,-10,-20,0,-10],
];
module ldraw_lib__3004(step=0, col=false, unit=2/5, alt=false, line=0.2, solid=!$preview)
    makepoly(ldraw_lib__3004(solid), step=step, col=col, unit=unit, alt=alt, line=line, solid=solid);
ldraw_lib__3004(line=0.2);
// main file
use <../lib.scad>
use <3070bph0.scad>
$fa=1; $fs=0.2;
function ldraw_lib__43755(realsolid=false) = [
// 0 =Tile  1 x  1 with Spider Pattern
// 0 Name: 43755.dat
// 0 Author: [PTadmin]
// 0 !LDRAW_ORG Part Alias UPDATE 2013-02
// 0 !LICENSE Licensed under CC BY 4.0 : see CAreadme.txt
// 
// 0 BFC CERTIFY CW
  [0,"BFC","CERTIFY"],
  [0,"BFC","CW"],
// 
// 0 !HISTORY 2010-04-05 [PTadmin] Official Update 2010-01
// 0 !HISTORY 2013-12-14 [cwdee] Add = prefix
// 0 !HISTORY 2013-12-23 [PTadmin] Official Update 2013-02
// 
// 
// 0 // Alias of 3070bph0
// 
// 1 16 0 0 0 1 0 0 0 1 0 0 0 1 3070bph0.dat
  [1,16,0,0,0,1,0,0,0,1,0,0,0,1, ldraw_lib__3070bph0(realsolid)],
// 0
];
module ldraw_lib__43755(step=0, col=false, unit=2/5, alt=false, line=0.2, solid=!$preview)
    makepoly(ldraw_lib__43755(solid), step=step, col=col, unit=unit, alt=alt, line=line, solid=solid);
ldraw_lib__43755(line=0.2);
